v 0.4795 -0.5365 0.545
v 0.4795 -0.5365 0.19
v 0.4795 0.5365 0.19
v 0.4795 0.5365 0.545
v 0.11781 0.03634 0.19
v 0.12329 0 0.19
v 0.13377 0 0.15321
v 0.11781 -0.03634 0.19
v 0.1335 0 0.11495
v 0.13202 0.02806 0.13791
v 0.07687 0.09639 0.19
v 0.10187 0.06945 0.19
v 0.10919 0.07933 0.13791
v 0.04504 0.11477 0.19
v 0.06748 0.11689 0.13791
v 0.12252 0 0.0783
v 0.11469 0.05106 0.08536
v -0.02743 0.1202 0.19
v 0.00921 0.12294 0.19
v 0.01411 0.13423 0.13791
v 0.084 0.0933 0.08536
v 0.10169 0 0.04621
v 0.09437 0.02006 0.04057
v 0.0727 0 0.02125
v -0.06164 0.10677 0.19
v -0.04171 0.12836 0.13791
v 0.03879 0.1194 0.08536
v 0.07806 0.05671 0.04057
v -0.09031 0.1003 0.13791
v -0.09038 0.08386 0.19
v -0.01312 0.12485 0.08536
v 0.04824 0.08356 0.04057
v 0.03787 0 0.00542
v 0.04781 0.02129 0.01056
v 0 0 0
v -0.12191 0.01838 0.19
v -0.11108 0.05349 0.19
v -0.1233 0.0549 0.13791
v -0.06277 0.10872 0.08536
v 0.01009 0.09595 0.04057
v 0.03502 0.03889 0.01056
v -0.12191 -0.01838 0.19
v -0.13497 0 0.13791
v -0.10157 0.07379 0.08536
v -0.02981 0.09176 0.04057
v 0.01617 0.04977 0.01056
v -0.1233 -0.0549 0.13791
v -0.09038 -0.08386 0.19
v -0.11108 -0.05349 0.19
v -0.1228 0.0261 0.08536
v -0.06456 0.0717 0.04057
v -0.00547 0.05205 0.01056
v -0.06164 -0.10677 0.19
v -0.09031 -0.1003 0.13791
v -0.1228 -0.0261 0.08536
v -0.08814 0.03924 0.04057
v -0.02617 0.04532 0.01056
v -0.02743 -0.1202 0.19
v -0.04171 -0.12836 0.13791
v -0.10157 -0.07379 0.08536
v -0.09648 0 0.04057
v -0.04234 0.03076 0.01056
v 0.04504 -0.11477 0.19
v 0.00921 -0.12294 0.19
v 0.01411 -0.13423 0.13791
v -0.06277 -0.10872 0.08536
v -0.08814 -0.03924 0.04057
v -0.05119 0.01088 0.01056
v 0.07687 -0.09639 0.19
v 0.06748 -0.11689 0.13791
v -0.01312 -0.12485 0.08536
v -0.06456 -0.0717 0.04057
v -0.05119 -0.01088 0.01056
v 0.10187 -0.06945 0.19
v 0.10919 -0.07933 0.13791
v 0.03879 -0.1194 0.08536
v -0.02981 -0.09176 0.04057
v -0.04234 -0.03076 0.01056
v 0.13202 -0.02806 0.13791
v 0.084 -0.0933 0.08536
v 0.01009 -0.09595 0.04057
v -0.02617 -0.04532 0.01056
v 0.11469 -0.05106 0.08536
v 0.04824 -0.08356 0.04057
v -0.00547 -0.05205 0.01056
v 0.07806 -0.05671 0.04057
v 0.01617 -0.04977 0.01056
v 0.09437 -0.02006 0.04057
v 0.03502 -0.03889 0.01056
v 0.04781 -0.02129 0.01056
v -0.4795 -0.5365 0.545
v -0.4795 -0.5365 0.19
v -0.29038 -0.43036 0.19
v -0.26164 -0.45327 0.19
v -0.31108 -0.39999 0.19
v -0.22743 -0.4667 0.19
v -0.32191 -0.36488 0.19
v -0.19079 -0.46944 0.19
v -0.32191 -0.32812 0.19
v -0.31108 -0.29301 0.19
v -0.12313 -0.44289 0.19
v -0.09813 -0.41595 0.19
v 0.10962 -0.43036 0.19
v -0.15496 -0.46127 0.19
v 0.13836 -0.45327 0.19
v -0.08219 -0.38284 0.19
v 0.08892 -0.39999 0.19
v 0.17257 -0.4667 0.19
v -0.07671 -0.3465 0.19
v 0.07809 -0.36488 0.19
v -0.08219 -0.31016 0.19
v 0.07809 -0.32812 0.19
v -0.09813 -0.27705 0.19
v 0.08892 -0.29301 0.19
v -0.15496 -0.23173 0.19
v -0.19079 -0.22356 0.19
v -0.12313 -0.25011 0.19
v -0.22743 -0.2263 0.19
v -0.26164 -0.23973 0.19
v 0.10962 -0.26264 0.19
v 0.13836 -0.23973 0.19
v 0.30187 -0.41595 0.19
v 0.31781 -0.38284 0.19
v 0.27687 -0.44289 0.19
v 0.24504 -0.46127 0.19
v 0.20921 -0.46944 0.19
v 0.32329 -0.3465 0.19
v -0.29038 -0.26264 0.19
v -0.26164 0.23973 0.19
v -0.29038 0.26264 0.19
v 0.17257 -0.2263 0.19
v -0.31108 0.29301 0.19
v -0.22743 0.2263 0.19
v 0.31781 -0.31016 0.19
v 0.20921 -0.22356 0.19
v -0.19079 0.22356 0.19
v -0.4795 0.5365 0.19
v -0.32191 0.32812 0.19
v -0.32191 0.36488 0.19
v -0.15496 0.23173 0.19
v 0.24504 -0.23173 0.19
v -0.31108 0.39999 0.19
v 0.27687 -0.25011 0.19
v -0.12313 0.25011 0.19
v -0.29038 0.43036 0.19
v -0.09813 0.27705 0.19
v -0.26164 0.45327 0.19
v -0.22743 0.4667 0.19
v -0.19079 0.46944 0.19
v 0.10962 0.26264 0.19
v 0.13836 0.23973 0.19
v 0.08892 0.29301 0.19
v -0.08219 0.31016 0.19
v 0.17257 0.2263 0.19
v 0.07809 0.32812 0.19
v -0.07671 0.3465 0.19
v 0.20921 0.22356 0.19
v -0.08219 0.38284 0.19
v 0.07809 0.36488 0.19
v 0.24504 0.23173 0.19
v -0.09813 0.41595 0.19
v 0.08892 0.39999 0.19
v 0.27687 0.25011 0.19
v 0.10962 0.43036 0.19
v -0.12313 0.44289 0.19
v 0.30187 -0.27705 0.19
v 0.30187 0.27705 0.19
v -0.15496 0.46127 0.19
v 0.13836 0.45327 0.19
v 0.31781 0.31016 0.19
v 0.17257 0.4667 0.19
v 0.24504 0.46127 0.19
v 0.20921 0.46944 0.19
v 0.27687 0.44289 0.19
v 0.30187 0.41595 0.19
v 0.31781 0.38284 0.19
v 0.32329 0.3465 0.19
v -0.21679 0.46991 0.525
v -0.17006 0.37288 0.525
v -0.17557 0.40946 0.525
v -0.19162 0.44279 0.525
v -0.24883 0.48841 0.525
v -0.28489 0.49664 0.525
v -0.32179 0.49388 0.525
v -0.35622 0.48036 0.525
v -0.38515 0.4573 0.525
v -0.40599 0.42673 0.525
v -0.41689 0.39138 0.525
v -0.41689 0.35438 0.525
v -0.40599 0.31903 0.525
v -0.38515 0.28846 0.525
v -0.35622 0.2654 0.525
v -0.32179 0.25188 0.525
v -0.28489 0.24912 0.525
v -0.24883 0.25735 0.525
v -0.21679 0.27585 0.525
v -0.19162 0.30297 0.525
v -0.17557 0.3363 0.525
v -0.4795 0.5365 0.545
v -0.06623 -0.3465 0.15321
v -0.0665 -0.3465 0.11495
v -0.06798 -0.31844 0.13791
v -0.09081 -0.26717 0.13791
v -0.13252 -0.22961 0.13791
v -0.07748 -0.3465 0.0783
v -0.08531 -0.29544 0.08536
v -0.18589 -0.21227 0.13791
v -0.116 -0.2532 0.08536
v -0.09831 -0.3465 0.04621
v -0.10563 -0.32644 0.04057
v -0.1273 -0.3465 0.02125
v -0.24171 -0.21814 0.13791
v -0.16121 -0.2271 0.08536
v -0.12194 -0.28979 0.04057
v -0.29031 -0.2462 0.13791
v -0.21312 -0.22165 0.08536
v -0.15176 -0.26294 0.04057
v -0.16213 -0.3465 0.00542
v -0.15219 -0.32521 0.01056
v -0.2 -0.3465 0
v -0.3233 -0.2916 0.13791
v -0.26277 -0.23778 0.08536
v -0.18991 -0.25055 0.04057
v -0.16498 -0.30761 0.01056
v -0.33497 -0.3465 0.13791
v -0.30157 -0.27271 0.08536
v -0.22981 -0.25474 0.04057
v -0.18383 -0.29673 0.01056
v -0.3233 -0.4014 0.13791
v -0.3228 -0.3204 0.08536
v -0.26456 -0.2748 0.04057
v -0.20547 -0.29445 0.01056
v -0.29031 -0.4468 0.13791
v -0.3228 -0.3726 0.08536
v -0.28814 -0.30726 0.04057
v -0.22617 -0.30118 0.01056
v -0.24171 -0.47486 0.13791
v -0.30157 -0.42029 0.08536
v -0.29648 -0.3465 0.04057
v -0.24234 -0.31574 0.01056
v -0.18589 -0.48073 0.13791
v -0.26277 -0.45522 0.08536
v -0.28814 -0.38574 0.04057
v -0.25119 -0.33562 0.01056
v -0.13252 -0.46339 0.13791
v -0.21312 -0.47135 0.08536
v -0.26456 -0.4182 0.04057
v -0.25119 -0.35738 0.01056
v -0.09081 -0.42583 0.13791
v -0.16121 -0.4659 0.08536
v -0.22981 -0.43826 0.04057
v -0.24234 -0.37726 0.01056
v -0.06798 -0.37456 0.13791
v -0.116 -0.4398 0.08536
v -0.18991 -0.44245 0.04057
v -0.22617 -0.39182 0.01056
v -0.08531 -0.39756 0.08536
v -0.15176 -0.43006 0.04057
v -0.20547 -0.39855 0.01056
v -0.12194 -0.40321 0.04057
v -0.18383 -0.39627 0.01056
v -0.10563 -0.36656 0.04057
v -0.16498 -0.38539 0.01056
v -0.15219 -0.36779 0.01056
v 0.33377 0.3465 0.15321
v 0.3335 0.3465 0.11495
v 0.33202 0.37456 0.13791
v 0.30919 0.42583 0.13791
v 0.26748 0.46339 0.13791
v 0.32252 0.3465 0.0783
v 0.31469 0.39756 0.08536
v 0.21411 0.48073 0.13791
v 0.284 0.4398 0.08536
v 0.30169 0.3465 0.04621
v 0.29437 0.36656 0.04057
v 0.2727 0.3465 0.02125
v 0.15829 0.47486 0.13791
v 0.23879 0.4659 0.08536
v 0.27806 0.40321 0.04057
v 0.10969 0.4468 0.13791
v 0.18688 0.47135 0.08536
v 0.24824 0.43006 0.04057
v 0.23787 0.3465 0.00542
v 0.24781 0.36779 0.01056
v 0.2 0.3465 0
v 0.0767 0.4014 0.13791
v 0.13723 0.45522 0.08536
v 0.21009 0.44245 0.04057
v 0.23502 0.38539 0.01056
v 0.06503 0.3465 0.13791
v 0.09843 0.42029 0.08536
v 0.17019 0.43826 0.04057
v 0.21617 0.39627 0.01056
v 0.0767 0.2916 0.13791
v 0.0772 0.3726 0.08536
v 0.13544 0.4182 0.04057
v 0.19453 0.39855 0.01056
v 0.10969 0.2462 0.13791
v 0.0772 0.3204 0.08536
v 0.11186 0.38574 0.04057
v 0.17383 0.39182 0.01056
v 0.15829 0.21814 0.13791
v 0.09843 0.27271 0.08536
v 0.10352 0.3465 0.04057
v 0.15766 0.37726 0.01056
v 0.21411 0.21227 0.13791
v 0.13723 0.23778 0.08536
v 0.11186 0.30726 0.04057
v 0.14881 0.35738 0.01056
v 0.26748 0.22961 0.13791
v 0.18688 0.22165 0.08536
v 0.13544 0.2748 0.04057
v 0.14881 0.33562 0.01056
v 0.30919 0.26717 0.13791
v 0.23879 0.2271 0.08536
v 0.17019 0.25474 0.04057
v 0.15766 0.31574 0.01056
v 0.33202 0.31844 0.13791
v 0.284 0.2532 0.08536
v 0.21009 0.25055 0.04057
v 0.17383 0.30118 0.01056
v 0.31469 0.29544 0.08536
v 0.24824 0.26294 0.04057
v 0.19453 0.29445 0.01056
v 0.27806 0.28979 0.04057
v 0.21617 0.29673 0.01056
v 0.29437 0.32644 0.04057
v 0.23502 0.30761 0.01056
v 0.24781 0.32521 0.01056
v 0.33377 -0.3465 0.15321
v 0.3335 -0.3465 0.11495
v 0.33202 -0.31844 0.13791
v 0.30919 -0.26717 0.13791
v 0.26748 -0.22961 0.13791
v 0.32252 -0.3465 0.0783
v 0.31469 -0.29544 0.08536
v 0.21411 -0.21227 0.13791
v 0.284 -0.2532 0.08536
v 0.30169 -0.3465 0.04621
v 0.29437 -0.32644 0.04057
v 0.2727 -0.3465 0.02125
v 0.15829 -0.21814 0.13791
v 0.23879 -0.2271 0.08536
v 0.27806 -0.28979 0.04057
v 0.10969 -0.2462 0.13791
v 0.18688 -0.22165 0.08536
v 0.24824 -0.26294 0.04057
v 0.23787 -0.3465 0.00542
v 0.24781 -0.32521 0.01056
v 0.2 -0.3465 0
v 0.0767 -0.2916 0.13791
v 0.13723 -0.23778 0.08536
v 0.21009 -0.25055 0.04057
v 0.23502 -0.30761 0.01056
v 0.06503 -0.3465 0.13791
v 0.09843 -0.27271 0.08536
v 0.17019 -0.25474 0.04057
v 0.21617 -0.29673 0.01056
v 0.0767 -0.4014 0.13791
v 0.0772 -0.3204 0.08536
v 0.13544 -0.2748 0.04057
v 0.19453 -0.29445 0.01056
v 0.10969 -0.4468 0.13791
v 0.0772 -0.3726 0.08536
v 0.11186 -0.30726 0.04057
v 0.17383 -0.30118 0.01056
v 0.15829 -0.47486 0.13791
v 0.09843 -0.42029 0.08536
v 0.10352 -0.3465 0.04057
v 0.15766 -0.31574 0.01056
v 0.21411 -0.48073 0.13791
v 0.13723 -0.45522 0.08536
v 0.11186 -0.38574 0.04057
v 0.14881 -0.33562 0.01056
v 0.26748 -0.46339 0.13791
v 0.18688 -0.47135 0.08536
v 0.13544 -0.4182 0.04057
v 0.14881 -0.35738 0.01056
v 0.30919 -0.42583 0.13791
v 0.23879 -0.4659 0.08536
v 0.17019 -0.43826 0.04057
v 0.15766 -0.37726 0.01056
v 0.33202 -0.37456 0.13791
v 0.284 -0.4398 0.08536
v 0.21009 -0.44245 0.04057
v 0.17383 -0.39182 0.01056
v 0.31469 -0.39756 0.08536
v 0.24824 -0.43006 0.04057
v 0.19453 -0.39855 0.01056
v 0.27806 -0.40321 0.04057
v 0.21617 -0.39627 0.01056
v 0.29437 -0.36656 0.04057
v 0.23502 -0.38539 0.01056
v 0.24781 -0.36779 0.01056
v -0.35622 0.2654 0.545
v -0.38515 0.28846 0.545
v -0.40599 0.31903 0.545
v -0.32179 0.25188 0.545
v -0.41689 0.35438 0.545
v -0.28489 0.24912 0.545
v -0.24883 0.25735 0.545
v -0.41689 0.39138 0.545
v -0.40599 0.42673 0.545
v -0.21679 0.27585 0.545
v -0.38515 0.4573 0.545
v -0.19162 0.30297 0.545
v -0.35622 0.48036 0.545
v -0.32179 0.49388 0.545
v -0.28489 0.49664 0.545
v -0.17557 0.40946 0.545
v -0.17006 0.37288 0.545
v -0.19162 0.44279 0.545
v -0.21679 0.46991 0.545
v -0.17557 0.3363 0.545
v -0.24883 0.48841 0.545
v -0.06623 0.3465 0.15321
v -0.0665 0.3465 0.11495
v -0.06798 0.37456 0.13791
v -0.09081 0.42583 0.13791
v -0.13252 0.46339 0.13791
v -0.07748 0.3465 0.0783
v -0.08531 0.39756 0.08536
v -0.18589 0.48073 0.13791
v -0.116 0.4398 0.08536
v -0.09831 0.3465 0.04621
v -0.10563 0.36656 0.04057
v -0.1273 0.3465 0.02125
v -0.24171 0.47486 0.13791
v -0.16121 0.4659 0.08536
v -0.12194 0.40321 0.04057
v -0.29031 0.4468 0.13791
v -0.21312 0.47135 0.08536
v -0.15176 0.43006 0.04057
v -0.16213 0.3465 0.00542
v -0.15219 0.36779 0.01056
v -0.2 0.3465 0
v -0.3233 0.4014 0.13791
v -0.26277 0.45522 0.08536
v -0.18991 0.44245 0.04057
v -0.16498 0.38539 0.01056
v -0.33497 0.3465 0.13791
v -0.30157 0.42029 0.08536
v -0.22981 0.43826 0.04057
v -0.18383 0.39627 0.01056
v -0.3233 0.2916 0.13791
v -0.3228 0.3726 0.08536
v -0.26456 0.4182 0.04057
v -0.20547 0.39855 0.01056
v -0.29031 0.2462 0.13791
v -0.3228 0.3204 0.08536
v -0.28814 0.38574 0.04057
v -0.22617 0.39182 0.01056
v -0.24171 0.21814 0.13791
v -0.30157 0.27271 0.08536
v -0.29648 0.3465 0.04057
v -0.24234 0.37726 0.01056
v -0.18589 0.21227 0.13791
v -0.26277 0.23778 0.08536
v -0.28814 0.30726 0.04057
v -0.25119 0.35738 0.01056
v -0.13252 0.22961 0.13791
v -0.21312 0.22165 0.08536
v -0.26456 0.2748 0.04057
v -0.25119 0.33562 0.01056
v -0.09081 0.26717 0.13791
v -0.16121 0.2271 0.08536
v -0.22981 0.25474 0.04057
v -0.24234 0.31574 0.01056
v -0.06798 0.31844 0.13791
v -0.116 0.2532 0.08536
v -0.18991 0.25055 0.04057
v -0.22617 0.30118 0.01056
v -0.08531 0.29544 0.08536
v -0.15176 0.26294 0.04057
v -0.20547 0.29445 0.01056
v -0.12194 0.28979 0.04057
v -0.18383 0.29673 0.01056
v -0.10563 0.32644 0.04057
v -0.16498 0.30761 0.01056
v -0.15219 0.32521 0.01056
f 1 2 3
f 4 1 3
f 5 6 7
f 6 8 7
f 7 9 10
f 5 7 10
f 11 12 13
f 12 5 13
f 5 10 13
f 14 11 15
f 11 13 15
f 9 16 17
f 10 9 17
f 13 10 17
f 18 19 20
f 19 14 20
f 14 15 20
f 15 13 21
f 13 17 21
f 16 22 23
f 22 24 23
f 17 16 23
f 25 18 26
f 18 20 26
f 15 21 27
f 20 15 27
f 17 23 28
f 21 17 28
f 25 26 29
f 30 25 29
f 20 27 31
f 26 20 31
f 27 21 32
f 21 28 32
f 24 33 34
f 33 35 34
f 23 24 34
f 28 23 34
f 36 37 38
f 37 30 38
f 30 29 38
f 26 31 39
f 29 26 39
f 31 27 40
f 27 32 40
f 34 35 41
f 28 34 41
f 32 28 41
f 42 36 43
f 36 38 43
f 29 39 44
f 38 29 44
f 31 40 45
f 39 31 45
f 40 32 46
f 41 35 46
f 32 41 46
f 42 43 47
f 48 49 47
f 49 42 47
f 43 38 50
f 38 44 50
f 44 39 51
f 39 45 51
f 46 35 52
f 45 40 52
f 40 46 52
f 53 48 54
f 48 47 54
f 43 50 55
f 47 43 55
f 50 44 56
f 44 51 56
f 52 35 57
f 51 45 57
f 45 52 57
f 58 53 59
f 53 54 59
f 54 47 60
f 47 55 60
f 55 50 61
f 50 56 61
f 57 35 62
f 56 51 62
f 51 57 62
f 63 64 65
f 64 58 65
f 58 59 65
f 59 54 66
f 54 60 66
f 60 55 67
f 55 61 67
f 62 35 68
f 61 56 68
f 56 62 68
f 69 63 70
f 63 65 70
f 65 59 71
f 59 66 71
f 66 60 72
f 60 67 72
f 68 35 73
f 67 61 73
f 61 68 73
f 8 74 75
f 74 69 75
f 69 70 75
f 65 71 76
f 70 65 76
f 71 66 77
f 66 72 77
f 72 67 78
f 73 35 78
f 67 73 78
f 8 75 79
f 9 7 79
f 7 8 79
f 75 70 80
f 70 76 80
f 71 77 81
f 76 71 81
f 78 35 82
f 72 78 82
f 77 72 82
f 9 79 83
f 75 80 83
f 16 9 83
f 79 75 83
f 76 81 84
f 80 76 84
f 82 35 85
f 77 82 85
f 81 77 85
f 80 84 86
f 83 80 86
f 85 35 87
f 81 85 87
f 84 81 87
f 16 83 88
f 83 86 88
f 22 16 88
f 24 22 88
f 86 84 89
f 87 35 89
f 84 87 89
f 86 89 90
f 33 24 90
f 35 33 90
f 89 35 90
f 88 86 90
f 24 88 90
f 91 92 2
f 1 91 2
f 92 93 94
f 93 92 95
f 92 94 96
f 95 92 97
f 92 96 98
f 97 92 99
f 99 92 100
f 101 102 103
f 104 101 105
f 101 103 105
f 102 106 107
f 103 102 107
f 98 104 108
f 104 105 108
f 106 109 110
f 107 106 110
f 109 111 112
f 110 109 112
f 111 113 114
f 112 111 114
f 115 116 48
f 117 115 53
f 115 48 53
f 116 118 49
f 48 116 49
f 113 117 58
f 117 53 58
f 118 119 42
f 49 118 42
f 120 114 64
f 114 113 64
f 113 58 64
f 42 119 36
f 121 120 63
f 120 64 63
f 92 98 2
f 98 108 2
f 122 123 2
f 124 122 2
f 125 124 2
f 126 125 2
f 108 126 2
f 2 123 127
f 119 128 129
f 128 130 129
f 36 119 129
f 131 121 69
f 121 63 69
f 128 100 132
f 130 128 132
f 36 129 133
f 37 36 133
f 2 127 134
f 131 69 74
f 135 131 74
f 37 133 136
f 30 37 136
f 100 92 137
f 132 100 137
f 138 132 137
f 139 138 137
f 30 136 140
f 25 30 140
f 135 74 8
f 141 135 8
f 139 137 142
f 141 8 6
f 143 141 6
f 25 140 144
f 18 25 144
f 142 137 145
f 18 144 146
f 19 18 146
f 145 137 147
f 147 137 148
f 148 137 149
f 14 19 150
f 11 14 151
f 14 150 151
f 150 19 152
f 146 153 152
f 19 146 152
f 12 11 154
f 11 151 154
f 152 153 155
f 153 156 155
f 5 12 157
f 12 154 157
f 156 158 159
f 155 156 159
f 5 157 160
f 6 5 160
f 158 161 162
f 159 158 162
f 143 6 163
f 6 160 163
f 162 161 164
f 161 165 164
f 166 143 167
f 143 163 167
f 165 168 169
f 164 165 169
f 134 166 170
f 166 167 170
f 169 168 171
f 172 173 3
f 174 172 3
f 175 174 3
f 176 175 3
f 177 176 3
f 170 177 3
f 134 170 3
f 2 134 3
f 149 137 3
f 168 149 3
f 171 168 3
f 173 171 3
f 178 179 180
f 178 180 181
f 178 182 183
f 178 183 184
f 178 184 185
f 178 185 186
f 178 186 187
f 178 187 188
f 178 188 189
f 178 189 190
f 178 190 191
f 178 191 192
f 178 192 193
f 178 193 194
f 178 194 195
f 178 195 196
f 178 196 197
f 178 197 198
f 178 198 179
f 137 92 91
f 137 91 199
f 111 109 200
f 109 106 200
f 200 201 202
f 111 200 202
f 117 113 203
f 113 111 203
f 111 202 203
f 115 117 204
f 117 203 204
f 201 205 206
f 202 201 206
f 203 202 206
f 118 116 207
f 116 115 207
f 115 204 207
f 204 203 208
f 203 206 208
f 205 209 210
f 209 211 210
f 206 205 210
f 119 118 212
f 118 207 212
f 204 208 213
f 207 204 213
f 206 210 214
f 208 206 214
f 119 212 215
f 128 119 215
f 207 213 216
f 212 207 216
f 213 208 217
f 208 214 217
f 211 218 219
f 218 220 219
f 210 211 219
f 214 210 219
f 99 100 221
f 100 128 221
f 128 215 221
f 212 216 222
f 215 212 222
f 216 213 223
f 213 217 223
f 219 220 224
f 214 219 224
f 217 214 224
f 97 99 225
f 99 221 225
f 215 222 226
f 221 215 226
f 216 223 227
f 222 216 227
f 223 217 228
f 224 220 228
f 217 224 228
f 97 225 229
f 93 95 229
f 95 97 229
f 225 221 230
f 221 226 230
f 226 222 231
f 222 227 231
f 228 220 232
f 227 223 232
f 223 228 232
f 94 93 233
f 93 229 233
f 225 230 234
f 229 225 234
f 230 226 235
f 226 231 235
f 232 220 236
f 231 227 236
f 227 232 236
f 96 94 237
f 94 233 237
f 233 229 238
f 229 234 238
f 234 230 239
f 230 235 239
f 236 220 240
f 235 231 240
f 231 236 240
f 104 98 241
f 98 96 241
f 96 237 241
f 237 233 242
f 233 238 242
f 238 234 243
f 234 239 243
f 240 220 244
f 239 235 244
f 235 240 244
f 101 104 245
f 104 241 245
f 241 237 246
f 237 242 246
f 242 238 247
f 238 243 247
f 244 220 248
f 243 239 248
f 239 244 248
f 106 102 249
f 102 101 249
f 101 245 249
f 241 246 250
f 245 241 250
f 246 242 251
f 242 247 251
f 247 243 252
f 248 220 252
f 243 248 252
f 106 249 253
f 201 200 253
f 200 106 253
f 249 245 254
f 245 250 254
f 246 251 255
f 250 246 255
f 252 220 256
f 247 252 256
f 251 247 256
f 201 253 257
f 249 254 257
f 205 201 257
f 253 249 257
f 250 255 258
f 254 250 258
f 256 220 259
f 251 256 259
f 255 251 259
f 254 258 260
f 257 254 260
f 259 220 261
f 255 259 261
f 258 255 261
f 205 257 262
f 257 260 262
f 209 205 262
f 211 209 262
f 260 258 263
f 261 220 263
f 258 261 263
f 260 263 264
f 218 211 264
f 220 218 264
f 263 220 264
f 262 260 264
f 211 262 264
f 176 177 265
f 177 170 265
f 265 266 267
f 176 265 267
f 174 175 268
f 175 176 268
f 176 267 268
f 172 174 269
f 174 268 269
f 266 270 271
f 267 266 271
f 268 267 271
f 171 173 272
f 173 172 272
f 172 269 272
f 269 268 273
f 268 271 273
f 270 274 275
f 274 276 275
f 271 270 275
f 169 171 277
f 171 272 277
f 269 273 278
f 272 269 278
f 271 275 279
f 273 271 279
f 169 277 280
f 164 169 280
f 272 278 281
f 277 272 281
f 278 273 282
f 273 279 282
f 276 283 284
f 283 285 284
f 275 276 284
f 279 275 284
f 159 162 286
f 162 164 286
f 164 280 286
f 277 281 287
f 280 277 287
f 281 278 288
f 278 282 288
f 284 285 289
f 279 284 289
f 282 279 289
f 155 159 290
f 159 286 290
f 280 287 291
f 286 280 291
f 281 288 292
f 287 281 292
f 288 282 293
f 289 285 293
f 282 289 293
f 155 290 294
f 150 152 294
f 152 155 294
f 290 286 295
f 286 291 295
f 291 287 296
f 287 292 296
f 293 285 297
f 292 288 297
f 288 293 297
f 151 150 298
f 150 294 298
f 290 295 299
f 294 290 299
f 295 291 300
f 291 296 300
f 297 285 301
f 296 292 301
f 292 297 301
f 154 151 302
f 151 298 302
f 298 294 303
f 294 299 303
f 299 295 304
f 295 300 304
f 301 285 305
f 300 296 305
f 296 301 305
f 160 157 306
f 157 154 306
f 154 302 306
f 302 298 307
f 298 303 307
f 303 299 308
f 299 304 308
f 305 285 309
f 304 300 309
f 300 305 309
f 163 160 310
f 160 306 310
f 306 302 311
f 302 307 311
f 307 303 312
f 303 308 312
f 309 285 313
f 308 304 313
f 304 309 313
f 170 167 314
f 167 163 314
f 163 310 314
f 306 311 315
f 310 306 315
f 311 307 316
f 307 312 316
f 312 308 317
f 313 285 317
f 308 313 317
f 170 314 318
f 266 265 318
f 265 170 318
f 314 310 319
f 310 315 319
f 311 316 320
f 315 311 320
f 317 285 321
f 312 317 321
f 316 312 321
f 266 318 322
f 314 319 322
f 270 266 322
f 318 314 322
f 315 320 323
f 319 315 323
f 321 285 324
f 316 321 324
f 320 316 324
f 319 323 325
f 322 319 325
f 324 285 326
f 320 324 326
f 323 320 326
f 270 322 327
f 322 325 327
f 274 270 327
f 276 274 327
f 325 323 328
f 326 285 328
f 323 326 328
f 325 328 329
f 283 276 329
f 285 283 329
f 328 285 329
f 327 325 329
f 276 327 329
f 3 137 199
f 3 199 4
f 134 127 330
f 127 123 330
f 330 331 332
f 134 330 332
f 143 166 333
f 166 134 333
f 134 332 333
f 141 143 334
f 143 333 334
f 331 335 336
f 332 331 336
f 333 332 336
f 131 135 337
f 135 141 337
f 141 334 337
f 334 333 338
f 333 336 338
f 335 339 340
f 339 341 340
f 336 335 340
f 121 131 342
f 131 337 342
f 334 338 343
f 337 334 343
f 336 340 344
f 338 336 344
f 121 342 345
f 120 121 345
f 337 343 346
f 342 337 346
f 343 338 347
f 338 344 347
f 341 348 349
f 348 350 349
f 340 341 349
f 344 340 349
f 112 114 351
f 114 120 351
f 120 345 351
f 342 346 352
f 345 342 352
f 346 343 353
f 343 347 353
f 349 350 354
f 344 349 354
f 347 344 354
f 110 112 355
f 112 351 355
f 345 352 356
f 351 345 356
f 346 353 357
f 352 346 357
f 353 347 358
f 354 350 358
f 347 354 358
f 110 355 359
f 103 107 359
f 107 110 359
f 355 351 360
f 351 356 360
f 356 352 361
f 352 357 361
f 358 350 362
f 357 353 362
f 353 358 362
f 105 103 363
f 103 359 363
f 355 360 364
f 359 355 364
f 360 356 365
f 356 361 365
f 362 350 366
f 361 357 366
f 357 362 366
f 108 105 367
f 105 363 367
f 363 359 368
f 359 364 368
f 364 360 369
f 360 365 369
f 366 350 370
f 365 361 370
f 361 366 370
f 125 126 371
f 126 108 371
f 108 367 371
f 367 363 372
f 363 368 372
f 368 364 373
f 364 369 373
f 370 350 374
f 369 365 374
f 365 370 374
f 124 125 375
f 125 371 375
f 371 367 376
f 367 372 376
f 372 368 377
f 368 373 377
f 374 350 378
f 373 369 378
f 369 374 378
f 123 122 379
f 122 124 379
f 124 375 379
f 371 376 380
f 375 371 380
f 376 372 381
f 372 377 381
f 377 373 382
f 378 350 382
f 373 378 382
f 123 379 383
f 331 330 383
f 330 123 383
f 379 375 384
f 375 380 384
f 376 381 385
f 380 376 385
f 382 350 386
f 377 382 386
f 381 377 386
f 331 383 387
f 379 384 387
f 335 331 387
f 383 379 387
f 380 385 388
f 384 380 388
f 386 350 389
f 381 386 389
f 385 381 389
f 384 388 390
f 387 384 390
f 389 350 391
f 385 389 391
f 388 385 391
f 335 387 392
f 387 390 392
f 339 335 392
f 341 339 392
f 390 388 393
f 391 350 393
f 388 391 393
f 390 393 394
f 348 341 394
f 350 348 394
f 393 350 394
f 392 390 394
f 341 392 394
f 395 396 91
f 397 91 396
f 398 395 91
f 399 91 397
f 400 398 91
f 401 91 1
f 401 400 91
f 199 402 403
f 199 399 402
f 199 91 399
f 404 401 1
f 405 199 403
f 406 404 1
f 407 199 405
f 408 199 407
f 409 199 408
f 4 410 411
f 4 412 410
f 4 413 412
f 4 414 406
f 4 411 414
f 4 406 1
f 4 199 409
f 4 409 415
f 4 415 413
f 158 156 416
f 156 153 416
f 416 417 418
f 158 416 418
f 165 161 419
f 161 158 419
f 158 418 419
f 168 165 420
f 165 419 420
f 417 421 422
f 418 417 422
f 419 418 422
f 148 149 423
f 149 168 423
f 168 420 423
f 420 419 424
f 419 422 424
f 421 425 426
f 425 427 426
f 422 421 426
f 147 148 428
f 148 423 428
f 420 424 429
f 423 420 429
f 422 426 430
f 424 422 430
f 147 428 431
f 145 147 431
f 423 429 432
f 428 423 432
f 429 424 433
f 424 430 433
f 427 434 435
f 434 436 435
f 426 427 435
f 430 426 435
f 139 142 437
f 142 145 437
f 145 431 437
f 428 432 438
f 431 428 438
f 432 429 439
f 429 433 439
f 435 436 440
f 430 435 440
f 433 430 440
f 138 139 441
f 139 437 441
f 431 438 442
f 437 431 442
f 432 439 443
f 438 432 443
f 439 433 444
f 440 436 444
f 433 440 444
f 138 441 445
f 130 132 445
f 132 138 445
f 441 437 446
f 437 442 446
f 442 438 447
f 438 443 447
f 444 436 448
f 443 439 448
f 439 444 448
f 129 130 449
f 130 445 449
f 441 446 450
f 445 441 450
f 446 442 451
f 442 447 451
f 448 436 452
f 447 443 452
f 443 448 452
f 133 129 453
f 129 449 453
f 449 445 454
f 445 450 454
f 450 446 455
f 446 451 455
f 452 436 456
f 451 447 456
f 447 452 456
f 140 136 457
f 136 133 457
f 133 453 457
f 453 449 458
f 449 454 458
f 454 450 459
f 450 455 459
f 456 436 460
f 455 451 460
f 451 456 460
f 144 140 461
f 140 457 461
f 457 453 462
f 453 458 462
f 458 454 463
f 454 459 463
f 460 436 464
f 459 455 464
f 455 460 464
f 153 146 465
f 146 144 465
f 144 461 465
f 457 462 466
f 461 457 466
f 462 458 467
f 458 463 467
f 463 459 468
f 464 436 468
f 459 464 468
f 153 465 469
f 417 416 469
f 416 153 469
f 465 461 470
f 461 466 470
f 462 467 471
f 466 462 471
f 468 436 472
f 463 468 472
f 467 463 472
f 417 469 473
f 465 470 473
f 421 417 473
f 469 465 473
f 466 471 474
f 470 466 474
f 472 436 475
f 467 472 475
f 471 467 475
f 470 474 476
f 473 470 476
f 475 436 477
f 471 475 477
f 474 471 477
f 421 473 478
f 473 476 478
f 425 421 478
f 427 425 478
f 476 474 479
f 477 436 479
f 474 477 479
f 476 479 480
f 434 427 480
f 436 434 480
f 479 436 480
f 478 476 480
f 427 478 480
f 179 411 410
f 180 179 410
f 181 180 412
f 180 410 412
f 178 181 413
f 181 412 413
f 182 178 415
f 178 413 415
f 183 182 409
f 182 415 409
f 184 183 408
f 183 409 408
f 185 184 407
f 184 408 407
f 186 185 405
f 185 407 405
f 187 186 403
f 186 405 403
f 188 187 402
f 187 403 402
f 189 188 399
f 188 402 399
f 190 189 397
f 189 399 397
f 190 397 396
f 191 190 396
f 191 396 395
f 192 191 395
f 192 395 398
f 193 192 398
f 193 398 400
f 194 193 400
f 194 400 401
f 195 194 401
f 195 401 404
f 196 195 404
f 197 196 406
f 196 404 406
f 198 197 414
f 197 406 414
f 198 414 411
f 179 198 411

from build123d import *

# Parameters (mm, degrees)
BOSS_EXTRUDE1_START  = 0.19
SKETCH1_W            = 0.959
SKETCH1_H            = 1.073
BOSS_EXTRUDE1_DEPTH  = 0.355
LPATTERN1_COUNT      = 2
LPATTERN1_PITCH      = 0.3465
LPATTERN1_COUNT_DIR2 = 2
LPATTERN1_PITCH_DIR2 = 0.2
SKETCH3_R            = 0.124110004
CUT_EXTRUDE3_DEPTH   = 0.02


with BuildPart() as part:
    # Sketch1 → Boss-Extrude1 (new body)
    with BuildSketch(Plane.XY.offset(BOSS_EXTRUDE1_START)):
        Rectangle(SKETCH1_W, SKETCH1_H)
    extrude(amount=BOSS_EXTRUDE1_DEPTH)

    # Sketch2 → Revolve1 (revolve)
    with BuildSketch(Plane(origin=(0, 0, 0), x_dir=(1, 0, 0), z_dir=(0, 1, 0))):
        with BuildLine():
            Line((0, 0), (0, -0.27))
            ThreePointArc((0, -0.27), (0.135, -0.135), (0, 0))
        make_face()
    revolve1 = revolve(axis=Axis((0, 0, 0), (0, 0, 1)))

    # LPattern1: Revolve1 2 × 2, 2 skipped
    with Locations(*[(j * LPATTERN1_PITCH_DIR2, i * LPATTERN1_PITCH, 0) for i in range(LPATTERN1_COUNT) for j in range(LPATTERN1_COUNT_DIR2) if (i, j) not in ((0, 0), (0, 1), (1, 0))]):
        add(revolve1)

    # LPattern2 copy 1 sketch → LPattern2 copy 1 (revolve)
    with BuildSketch(Plane(origin=(-0.2, 0.3465, 0), x_dir=(1, 0, 0), z_dir=(0, 1, 0))):
        with BuildLine():
            Line((0, 0), (0, -0.27))
            ThreePointArc((0, -0.27), (0.135, -0.135), (0, 0))
        make_face()
    revolve(axis=Axis((-0.2, 0.3465, 0), (0, 0, 1)))

    # LPattern2 copy 2 sketch → LPattern2 copy 2 (revolve)
    with BuildSketch(Plane(origin=(0.2, -0.3465, 0), x_dir=(1, 0, 0), z_dir=(0, 1, 0))):
        with BuildLine():
            Line((0, 0), (0, -0.27))
            ThreePointArc((0, -0.27), (0.135, -0.135), (0, 0))
        make_face()
    revolve(axis=Axis((0.2, -0.3465, 0), (0, 0, 1)))

    # LPattern2 copy 3 sketch → LPattern2 copy 3 (revolve)
    with BuildSketch(Plane(origin=(-0.2, -0.3465, 0), x_dir=(1, 0, 0), z_dir=(0, 1, 0))):
        with BuildLine():
            Line((0, 0), (0, -0.27))
            ThreePointArc((0, -0.27), (0.135, -0.135), (0, 0))
        make_face()
    revolve(axis=Axis((-0.2, -0.3465, 0), (0, 0, 1)))

    # Sketch3 → Cut-Extrude3 (cut)
    with BuildSketch(Plane.XY.offset(0.545)):
        with Locations((-0.294168663, 0.372880622)):
            Circle(SKETCH3_R)
    extrude(amount=-CUT_EXTRUDE3_DEPTH, mode=Mode.SUBTRACT)


solid = part.part
